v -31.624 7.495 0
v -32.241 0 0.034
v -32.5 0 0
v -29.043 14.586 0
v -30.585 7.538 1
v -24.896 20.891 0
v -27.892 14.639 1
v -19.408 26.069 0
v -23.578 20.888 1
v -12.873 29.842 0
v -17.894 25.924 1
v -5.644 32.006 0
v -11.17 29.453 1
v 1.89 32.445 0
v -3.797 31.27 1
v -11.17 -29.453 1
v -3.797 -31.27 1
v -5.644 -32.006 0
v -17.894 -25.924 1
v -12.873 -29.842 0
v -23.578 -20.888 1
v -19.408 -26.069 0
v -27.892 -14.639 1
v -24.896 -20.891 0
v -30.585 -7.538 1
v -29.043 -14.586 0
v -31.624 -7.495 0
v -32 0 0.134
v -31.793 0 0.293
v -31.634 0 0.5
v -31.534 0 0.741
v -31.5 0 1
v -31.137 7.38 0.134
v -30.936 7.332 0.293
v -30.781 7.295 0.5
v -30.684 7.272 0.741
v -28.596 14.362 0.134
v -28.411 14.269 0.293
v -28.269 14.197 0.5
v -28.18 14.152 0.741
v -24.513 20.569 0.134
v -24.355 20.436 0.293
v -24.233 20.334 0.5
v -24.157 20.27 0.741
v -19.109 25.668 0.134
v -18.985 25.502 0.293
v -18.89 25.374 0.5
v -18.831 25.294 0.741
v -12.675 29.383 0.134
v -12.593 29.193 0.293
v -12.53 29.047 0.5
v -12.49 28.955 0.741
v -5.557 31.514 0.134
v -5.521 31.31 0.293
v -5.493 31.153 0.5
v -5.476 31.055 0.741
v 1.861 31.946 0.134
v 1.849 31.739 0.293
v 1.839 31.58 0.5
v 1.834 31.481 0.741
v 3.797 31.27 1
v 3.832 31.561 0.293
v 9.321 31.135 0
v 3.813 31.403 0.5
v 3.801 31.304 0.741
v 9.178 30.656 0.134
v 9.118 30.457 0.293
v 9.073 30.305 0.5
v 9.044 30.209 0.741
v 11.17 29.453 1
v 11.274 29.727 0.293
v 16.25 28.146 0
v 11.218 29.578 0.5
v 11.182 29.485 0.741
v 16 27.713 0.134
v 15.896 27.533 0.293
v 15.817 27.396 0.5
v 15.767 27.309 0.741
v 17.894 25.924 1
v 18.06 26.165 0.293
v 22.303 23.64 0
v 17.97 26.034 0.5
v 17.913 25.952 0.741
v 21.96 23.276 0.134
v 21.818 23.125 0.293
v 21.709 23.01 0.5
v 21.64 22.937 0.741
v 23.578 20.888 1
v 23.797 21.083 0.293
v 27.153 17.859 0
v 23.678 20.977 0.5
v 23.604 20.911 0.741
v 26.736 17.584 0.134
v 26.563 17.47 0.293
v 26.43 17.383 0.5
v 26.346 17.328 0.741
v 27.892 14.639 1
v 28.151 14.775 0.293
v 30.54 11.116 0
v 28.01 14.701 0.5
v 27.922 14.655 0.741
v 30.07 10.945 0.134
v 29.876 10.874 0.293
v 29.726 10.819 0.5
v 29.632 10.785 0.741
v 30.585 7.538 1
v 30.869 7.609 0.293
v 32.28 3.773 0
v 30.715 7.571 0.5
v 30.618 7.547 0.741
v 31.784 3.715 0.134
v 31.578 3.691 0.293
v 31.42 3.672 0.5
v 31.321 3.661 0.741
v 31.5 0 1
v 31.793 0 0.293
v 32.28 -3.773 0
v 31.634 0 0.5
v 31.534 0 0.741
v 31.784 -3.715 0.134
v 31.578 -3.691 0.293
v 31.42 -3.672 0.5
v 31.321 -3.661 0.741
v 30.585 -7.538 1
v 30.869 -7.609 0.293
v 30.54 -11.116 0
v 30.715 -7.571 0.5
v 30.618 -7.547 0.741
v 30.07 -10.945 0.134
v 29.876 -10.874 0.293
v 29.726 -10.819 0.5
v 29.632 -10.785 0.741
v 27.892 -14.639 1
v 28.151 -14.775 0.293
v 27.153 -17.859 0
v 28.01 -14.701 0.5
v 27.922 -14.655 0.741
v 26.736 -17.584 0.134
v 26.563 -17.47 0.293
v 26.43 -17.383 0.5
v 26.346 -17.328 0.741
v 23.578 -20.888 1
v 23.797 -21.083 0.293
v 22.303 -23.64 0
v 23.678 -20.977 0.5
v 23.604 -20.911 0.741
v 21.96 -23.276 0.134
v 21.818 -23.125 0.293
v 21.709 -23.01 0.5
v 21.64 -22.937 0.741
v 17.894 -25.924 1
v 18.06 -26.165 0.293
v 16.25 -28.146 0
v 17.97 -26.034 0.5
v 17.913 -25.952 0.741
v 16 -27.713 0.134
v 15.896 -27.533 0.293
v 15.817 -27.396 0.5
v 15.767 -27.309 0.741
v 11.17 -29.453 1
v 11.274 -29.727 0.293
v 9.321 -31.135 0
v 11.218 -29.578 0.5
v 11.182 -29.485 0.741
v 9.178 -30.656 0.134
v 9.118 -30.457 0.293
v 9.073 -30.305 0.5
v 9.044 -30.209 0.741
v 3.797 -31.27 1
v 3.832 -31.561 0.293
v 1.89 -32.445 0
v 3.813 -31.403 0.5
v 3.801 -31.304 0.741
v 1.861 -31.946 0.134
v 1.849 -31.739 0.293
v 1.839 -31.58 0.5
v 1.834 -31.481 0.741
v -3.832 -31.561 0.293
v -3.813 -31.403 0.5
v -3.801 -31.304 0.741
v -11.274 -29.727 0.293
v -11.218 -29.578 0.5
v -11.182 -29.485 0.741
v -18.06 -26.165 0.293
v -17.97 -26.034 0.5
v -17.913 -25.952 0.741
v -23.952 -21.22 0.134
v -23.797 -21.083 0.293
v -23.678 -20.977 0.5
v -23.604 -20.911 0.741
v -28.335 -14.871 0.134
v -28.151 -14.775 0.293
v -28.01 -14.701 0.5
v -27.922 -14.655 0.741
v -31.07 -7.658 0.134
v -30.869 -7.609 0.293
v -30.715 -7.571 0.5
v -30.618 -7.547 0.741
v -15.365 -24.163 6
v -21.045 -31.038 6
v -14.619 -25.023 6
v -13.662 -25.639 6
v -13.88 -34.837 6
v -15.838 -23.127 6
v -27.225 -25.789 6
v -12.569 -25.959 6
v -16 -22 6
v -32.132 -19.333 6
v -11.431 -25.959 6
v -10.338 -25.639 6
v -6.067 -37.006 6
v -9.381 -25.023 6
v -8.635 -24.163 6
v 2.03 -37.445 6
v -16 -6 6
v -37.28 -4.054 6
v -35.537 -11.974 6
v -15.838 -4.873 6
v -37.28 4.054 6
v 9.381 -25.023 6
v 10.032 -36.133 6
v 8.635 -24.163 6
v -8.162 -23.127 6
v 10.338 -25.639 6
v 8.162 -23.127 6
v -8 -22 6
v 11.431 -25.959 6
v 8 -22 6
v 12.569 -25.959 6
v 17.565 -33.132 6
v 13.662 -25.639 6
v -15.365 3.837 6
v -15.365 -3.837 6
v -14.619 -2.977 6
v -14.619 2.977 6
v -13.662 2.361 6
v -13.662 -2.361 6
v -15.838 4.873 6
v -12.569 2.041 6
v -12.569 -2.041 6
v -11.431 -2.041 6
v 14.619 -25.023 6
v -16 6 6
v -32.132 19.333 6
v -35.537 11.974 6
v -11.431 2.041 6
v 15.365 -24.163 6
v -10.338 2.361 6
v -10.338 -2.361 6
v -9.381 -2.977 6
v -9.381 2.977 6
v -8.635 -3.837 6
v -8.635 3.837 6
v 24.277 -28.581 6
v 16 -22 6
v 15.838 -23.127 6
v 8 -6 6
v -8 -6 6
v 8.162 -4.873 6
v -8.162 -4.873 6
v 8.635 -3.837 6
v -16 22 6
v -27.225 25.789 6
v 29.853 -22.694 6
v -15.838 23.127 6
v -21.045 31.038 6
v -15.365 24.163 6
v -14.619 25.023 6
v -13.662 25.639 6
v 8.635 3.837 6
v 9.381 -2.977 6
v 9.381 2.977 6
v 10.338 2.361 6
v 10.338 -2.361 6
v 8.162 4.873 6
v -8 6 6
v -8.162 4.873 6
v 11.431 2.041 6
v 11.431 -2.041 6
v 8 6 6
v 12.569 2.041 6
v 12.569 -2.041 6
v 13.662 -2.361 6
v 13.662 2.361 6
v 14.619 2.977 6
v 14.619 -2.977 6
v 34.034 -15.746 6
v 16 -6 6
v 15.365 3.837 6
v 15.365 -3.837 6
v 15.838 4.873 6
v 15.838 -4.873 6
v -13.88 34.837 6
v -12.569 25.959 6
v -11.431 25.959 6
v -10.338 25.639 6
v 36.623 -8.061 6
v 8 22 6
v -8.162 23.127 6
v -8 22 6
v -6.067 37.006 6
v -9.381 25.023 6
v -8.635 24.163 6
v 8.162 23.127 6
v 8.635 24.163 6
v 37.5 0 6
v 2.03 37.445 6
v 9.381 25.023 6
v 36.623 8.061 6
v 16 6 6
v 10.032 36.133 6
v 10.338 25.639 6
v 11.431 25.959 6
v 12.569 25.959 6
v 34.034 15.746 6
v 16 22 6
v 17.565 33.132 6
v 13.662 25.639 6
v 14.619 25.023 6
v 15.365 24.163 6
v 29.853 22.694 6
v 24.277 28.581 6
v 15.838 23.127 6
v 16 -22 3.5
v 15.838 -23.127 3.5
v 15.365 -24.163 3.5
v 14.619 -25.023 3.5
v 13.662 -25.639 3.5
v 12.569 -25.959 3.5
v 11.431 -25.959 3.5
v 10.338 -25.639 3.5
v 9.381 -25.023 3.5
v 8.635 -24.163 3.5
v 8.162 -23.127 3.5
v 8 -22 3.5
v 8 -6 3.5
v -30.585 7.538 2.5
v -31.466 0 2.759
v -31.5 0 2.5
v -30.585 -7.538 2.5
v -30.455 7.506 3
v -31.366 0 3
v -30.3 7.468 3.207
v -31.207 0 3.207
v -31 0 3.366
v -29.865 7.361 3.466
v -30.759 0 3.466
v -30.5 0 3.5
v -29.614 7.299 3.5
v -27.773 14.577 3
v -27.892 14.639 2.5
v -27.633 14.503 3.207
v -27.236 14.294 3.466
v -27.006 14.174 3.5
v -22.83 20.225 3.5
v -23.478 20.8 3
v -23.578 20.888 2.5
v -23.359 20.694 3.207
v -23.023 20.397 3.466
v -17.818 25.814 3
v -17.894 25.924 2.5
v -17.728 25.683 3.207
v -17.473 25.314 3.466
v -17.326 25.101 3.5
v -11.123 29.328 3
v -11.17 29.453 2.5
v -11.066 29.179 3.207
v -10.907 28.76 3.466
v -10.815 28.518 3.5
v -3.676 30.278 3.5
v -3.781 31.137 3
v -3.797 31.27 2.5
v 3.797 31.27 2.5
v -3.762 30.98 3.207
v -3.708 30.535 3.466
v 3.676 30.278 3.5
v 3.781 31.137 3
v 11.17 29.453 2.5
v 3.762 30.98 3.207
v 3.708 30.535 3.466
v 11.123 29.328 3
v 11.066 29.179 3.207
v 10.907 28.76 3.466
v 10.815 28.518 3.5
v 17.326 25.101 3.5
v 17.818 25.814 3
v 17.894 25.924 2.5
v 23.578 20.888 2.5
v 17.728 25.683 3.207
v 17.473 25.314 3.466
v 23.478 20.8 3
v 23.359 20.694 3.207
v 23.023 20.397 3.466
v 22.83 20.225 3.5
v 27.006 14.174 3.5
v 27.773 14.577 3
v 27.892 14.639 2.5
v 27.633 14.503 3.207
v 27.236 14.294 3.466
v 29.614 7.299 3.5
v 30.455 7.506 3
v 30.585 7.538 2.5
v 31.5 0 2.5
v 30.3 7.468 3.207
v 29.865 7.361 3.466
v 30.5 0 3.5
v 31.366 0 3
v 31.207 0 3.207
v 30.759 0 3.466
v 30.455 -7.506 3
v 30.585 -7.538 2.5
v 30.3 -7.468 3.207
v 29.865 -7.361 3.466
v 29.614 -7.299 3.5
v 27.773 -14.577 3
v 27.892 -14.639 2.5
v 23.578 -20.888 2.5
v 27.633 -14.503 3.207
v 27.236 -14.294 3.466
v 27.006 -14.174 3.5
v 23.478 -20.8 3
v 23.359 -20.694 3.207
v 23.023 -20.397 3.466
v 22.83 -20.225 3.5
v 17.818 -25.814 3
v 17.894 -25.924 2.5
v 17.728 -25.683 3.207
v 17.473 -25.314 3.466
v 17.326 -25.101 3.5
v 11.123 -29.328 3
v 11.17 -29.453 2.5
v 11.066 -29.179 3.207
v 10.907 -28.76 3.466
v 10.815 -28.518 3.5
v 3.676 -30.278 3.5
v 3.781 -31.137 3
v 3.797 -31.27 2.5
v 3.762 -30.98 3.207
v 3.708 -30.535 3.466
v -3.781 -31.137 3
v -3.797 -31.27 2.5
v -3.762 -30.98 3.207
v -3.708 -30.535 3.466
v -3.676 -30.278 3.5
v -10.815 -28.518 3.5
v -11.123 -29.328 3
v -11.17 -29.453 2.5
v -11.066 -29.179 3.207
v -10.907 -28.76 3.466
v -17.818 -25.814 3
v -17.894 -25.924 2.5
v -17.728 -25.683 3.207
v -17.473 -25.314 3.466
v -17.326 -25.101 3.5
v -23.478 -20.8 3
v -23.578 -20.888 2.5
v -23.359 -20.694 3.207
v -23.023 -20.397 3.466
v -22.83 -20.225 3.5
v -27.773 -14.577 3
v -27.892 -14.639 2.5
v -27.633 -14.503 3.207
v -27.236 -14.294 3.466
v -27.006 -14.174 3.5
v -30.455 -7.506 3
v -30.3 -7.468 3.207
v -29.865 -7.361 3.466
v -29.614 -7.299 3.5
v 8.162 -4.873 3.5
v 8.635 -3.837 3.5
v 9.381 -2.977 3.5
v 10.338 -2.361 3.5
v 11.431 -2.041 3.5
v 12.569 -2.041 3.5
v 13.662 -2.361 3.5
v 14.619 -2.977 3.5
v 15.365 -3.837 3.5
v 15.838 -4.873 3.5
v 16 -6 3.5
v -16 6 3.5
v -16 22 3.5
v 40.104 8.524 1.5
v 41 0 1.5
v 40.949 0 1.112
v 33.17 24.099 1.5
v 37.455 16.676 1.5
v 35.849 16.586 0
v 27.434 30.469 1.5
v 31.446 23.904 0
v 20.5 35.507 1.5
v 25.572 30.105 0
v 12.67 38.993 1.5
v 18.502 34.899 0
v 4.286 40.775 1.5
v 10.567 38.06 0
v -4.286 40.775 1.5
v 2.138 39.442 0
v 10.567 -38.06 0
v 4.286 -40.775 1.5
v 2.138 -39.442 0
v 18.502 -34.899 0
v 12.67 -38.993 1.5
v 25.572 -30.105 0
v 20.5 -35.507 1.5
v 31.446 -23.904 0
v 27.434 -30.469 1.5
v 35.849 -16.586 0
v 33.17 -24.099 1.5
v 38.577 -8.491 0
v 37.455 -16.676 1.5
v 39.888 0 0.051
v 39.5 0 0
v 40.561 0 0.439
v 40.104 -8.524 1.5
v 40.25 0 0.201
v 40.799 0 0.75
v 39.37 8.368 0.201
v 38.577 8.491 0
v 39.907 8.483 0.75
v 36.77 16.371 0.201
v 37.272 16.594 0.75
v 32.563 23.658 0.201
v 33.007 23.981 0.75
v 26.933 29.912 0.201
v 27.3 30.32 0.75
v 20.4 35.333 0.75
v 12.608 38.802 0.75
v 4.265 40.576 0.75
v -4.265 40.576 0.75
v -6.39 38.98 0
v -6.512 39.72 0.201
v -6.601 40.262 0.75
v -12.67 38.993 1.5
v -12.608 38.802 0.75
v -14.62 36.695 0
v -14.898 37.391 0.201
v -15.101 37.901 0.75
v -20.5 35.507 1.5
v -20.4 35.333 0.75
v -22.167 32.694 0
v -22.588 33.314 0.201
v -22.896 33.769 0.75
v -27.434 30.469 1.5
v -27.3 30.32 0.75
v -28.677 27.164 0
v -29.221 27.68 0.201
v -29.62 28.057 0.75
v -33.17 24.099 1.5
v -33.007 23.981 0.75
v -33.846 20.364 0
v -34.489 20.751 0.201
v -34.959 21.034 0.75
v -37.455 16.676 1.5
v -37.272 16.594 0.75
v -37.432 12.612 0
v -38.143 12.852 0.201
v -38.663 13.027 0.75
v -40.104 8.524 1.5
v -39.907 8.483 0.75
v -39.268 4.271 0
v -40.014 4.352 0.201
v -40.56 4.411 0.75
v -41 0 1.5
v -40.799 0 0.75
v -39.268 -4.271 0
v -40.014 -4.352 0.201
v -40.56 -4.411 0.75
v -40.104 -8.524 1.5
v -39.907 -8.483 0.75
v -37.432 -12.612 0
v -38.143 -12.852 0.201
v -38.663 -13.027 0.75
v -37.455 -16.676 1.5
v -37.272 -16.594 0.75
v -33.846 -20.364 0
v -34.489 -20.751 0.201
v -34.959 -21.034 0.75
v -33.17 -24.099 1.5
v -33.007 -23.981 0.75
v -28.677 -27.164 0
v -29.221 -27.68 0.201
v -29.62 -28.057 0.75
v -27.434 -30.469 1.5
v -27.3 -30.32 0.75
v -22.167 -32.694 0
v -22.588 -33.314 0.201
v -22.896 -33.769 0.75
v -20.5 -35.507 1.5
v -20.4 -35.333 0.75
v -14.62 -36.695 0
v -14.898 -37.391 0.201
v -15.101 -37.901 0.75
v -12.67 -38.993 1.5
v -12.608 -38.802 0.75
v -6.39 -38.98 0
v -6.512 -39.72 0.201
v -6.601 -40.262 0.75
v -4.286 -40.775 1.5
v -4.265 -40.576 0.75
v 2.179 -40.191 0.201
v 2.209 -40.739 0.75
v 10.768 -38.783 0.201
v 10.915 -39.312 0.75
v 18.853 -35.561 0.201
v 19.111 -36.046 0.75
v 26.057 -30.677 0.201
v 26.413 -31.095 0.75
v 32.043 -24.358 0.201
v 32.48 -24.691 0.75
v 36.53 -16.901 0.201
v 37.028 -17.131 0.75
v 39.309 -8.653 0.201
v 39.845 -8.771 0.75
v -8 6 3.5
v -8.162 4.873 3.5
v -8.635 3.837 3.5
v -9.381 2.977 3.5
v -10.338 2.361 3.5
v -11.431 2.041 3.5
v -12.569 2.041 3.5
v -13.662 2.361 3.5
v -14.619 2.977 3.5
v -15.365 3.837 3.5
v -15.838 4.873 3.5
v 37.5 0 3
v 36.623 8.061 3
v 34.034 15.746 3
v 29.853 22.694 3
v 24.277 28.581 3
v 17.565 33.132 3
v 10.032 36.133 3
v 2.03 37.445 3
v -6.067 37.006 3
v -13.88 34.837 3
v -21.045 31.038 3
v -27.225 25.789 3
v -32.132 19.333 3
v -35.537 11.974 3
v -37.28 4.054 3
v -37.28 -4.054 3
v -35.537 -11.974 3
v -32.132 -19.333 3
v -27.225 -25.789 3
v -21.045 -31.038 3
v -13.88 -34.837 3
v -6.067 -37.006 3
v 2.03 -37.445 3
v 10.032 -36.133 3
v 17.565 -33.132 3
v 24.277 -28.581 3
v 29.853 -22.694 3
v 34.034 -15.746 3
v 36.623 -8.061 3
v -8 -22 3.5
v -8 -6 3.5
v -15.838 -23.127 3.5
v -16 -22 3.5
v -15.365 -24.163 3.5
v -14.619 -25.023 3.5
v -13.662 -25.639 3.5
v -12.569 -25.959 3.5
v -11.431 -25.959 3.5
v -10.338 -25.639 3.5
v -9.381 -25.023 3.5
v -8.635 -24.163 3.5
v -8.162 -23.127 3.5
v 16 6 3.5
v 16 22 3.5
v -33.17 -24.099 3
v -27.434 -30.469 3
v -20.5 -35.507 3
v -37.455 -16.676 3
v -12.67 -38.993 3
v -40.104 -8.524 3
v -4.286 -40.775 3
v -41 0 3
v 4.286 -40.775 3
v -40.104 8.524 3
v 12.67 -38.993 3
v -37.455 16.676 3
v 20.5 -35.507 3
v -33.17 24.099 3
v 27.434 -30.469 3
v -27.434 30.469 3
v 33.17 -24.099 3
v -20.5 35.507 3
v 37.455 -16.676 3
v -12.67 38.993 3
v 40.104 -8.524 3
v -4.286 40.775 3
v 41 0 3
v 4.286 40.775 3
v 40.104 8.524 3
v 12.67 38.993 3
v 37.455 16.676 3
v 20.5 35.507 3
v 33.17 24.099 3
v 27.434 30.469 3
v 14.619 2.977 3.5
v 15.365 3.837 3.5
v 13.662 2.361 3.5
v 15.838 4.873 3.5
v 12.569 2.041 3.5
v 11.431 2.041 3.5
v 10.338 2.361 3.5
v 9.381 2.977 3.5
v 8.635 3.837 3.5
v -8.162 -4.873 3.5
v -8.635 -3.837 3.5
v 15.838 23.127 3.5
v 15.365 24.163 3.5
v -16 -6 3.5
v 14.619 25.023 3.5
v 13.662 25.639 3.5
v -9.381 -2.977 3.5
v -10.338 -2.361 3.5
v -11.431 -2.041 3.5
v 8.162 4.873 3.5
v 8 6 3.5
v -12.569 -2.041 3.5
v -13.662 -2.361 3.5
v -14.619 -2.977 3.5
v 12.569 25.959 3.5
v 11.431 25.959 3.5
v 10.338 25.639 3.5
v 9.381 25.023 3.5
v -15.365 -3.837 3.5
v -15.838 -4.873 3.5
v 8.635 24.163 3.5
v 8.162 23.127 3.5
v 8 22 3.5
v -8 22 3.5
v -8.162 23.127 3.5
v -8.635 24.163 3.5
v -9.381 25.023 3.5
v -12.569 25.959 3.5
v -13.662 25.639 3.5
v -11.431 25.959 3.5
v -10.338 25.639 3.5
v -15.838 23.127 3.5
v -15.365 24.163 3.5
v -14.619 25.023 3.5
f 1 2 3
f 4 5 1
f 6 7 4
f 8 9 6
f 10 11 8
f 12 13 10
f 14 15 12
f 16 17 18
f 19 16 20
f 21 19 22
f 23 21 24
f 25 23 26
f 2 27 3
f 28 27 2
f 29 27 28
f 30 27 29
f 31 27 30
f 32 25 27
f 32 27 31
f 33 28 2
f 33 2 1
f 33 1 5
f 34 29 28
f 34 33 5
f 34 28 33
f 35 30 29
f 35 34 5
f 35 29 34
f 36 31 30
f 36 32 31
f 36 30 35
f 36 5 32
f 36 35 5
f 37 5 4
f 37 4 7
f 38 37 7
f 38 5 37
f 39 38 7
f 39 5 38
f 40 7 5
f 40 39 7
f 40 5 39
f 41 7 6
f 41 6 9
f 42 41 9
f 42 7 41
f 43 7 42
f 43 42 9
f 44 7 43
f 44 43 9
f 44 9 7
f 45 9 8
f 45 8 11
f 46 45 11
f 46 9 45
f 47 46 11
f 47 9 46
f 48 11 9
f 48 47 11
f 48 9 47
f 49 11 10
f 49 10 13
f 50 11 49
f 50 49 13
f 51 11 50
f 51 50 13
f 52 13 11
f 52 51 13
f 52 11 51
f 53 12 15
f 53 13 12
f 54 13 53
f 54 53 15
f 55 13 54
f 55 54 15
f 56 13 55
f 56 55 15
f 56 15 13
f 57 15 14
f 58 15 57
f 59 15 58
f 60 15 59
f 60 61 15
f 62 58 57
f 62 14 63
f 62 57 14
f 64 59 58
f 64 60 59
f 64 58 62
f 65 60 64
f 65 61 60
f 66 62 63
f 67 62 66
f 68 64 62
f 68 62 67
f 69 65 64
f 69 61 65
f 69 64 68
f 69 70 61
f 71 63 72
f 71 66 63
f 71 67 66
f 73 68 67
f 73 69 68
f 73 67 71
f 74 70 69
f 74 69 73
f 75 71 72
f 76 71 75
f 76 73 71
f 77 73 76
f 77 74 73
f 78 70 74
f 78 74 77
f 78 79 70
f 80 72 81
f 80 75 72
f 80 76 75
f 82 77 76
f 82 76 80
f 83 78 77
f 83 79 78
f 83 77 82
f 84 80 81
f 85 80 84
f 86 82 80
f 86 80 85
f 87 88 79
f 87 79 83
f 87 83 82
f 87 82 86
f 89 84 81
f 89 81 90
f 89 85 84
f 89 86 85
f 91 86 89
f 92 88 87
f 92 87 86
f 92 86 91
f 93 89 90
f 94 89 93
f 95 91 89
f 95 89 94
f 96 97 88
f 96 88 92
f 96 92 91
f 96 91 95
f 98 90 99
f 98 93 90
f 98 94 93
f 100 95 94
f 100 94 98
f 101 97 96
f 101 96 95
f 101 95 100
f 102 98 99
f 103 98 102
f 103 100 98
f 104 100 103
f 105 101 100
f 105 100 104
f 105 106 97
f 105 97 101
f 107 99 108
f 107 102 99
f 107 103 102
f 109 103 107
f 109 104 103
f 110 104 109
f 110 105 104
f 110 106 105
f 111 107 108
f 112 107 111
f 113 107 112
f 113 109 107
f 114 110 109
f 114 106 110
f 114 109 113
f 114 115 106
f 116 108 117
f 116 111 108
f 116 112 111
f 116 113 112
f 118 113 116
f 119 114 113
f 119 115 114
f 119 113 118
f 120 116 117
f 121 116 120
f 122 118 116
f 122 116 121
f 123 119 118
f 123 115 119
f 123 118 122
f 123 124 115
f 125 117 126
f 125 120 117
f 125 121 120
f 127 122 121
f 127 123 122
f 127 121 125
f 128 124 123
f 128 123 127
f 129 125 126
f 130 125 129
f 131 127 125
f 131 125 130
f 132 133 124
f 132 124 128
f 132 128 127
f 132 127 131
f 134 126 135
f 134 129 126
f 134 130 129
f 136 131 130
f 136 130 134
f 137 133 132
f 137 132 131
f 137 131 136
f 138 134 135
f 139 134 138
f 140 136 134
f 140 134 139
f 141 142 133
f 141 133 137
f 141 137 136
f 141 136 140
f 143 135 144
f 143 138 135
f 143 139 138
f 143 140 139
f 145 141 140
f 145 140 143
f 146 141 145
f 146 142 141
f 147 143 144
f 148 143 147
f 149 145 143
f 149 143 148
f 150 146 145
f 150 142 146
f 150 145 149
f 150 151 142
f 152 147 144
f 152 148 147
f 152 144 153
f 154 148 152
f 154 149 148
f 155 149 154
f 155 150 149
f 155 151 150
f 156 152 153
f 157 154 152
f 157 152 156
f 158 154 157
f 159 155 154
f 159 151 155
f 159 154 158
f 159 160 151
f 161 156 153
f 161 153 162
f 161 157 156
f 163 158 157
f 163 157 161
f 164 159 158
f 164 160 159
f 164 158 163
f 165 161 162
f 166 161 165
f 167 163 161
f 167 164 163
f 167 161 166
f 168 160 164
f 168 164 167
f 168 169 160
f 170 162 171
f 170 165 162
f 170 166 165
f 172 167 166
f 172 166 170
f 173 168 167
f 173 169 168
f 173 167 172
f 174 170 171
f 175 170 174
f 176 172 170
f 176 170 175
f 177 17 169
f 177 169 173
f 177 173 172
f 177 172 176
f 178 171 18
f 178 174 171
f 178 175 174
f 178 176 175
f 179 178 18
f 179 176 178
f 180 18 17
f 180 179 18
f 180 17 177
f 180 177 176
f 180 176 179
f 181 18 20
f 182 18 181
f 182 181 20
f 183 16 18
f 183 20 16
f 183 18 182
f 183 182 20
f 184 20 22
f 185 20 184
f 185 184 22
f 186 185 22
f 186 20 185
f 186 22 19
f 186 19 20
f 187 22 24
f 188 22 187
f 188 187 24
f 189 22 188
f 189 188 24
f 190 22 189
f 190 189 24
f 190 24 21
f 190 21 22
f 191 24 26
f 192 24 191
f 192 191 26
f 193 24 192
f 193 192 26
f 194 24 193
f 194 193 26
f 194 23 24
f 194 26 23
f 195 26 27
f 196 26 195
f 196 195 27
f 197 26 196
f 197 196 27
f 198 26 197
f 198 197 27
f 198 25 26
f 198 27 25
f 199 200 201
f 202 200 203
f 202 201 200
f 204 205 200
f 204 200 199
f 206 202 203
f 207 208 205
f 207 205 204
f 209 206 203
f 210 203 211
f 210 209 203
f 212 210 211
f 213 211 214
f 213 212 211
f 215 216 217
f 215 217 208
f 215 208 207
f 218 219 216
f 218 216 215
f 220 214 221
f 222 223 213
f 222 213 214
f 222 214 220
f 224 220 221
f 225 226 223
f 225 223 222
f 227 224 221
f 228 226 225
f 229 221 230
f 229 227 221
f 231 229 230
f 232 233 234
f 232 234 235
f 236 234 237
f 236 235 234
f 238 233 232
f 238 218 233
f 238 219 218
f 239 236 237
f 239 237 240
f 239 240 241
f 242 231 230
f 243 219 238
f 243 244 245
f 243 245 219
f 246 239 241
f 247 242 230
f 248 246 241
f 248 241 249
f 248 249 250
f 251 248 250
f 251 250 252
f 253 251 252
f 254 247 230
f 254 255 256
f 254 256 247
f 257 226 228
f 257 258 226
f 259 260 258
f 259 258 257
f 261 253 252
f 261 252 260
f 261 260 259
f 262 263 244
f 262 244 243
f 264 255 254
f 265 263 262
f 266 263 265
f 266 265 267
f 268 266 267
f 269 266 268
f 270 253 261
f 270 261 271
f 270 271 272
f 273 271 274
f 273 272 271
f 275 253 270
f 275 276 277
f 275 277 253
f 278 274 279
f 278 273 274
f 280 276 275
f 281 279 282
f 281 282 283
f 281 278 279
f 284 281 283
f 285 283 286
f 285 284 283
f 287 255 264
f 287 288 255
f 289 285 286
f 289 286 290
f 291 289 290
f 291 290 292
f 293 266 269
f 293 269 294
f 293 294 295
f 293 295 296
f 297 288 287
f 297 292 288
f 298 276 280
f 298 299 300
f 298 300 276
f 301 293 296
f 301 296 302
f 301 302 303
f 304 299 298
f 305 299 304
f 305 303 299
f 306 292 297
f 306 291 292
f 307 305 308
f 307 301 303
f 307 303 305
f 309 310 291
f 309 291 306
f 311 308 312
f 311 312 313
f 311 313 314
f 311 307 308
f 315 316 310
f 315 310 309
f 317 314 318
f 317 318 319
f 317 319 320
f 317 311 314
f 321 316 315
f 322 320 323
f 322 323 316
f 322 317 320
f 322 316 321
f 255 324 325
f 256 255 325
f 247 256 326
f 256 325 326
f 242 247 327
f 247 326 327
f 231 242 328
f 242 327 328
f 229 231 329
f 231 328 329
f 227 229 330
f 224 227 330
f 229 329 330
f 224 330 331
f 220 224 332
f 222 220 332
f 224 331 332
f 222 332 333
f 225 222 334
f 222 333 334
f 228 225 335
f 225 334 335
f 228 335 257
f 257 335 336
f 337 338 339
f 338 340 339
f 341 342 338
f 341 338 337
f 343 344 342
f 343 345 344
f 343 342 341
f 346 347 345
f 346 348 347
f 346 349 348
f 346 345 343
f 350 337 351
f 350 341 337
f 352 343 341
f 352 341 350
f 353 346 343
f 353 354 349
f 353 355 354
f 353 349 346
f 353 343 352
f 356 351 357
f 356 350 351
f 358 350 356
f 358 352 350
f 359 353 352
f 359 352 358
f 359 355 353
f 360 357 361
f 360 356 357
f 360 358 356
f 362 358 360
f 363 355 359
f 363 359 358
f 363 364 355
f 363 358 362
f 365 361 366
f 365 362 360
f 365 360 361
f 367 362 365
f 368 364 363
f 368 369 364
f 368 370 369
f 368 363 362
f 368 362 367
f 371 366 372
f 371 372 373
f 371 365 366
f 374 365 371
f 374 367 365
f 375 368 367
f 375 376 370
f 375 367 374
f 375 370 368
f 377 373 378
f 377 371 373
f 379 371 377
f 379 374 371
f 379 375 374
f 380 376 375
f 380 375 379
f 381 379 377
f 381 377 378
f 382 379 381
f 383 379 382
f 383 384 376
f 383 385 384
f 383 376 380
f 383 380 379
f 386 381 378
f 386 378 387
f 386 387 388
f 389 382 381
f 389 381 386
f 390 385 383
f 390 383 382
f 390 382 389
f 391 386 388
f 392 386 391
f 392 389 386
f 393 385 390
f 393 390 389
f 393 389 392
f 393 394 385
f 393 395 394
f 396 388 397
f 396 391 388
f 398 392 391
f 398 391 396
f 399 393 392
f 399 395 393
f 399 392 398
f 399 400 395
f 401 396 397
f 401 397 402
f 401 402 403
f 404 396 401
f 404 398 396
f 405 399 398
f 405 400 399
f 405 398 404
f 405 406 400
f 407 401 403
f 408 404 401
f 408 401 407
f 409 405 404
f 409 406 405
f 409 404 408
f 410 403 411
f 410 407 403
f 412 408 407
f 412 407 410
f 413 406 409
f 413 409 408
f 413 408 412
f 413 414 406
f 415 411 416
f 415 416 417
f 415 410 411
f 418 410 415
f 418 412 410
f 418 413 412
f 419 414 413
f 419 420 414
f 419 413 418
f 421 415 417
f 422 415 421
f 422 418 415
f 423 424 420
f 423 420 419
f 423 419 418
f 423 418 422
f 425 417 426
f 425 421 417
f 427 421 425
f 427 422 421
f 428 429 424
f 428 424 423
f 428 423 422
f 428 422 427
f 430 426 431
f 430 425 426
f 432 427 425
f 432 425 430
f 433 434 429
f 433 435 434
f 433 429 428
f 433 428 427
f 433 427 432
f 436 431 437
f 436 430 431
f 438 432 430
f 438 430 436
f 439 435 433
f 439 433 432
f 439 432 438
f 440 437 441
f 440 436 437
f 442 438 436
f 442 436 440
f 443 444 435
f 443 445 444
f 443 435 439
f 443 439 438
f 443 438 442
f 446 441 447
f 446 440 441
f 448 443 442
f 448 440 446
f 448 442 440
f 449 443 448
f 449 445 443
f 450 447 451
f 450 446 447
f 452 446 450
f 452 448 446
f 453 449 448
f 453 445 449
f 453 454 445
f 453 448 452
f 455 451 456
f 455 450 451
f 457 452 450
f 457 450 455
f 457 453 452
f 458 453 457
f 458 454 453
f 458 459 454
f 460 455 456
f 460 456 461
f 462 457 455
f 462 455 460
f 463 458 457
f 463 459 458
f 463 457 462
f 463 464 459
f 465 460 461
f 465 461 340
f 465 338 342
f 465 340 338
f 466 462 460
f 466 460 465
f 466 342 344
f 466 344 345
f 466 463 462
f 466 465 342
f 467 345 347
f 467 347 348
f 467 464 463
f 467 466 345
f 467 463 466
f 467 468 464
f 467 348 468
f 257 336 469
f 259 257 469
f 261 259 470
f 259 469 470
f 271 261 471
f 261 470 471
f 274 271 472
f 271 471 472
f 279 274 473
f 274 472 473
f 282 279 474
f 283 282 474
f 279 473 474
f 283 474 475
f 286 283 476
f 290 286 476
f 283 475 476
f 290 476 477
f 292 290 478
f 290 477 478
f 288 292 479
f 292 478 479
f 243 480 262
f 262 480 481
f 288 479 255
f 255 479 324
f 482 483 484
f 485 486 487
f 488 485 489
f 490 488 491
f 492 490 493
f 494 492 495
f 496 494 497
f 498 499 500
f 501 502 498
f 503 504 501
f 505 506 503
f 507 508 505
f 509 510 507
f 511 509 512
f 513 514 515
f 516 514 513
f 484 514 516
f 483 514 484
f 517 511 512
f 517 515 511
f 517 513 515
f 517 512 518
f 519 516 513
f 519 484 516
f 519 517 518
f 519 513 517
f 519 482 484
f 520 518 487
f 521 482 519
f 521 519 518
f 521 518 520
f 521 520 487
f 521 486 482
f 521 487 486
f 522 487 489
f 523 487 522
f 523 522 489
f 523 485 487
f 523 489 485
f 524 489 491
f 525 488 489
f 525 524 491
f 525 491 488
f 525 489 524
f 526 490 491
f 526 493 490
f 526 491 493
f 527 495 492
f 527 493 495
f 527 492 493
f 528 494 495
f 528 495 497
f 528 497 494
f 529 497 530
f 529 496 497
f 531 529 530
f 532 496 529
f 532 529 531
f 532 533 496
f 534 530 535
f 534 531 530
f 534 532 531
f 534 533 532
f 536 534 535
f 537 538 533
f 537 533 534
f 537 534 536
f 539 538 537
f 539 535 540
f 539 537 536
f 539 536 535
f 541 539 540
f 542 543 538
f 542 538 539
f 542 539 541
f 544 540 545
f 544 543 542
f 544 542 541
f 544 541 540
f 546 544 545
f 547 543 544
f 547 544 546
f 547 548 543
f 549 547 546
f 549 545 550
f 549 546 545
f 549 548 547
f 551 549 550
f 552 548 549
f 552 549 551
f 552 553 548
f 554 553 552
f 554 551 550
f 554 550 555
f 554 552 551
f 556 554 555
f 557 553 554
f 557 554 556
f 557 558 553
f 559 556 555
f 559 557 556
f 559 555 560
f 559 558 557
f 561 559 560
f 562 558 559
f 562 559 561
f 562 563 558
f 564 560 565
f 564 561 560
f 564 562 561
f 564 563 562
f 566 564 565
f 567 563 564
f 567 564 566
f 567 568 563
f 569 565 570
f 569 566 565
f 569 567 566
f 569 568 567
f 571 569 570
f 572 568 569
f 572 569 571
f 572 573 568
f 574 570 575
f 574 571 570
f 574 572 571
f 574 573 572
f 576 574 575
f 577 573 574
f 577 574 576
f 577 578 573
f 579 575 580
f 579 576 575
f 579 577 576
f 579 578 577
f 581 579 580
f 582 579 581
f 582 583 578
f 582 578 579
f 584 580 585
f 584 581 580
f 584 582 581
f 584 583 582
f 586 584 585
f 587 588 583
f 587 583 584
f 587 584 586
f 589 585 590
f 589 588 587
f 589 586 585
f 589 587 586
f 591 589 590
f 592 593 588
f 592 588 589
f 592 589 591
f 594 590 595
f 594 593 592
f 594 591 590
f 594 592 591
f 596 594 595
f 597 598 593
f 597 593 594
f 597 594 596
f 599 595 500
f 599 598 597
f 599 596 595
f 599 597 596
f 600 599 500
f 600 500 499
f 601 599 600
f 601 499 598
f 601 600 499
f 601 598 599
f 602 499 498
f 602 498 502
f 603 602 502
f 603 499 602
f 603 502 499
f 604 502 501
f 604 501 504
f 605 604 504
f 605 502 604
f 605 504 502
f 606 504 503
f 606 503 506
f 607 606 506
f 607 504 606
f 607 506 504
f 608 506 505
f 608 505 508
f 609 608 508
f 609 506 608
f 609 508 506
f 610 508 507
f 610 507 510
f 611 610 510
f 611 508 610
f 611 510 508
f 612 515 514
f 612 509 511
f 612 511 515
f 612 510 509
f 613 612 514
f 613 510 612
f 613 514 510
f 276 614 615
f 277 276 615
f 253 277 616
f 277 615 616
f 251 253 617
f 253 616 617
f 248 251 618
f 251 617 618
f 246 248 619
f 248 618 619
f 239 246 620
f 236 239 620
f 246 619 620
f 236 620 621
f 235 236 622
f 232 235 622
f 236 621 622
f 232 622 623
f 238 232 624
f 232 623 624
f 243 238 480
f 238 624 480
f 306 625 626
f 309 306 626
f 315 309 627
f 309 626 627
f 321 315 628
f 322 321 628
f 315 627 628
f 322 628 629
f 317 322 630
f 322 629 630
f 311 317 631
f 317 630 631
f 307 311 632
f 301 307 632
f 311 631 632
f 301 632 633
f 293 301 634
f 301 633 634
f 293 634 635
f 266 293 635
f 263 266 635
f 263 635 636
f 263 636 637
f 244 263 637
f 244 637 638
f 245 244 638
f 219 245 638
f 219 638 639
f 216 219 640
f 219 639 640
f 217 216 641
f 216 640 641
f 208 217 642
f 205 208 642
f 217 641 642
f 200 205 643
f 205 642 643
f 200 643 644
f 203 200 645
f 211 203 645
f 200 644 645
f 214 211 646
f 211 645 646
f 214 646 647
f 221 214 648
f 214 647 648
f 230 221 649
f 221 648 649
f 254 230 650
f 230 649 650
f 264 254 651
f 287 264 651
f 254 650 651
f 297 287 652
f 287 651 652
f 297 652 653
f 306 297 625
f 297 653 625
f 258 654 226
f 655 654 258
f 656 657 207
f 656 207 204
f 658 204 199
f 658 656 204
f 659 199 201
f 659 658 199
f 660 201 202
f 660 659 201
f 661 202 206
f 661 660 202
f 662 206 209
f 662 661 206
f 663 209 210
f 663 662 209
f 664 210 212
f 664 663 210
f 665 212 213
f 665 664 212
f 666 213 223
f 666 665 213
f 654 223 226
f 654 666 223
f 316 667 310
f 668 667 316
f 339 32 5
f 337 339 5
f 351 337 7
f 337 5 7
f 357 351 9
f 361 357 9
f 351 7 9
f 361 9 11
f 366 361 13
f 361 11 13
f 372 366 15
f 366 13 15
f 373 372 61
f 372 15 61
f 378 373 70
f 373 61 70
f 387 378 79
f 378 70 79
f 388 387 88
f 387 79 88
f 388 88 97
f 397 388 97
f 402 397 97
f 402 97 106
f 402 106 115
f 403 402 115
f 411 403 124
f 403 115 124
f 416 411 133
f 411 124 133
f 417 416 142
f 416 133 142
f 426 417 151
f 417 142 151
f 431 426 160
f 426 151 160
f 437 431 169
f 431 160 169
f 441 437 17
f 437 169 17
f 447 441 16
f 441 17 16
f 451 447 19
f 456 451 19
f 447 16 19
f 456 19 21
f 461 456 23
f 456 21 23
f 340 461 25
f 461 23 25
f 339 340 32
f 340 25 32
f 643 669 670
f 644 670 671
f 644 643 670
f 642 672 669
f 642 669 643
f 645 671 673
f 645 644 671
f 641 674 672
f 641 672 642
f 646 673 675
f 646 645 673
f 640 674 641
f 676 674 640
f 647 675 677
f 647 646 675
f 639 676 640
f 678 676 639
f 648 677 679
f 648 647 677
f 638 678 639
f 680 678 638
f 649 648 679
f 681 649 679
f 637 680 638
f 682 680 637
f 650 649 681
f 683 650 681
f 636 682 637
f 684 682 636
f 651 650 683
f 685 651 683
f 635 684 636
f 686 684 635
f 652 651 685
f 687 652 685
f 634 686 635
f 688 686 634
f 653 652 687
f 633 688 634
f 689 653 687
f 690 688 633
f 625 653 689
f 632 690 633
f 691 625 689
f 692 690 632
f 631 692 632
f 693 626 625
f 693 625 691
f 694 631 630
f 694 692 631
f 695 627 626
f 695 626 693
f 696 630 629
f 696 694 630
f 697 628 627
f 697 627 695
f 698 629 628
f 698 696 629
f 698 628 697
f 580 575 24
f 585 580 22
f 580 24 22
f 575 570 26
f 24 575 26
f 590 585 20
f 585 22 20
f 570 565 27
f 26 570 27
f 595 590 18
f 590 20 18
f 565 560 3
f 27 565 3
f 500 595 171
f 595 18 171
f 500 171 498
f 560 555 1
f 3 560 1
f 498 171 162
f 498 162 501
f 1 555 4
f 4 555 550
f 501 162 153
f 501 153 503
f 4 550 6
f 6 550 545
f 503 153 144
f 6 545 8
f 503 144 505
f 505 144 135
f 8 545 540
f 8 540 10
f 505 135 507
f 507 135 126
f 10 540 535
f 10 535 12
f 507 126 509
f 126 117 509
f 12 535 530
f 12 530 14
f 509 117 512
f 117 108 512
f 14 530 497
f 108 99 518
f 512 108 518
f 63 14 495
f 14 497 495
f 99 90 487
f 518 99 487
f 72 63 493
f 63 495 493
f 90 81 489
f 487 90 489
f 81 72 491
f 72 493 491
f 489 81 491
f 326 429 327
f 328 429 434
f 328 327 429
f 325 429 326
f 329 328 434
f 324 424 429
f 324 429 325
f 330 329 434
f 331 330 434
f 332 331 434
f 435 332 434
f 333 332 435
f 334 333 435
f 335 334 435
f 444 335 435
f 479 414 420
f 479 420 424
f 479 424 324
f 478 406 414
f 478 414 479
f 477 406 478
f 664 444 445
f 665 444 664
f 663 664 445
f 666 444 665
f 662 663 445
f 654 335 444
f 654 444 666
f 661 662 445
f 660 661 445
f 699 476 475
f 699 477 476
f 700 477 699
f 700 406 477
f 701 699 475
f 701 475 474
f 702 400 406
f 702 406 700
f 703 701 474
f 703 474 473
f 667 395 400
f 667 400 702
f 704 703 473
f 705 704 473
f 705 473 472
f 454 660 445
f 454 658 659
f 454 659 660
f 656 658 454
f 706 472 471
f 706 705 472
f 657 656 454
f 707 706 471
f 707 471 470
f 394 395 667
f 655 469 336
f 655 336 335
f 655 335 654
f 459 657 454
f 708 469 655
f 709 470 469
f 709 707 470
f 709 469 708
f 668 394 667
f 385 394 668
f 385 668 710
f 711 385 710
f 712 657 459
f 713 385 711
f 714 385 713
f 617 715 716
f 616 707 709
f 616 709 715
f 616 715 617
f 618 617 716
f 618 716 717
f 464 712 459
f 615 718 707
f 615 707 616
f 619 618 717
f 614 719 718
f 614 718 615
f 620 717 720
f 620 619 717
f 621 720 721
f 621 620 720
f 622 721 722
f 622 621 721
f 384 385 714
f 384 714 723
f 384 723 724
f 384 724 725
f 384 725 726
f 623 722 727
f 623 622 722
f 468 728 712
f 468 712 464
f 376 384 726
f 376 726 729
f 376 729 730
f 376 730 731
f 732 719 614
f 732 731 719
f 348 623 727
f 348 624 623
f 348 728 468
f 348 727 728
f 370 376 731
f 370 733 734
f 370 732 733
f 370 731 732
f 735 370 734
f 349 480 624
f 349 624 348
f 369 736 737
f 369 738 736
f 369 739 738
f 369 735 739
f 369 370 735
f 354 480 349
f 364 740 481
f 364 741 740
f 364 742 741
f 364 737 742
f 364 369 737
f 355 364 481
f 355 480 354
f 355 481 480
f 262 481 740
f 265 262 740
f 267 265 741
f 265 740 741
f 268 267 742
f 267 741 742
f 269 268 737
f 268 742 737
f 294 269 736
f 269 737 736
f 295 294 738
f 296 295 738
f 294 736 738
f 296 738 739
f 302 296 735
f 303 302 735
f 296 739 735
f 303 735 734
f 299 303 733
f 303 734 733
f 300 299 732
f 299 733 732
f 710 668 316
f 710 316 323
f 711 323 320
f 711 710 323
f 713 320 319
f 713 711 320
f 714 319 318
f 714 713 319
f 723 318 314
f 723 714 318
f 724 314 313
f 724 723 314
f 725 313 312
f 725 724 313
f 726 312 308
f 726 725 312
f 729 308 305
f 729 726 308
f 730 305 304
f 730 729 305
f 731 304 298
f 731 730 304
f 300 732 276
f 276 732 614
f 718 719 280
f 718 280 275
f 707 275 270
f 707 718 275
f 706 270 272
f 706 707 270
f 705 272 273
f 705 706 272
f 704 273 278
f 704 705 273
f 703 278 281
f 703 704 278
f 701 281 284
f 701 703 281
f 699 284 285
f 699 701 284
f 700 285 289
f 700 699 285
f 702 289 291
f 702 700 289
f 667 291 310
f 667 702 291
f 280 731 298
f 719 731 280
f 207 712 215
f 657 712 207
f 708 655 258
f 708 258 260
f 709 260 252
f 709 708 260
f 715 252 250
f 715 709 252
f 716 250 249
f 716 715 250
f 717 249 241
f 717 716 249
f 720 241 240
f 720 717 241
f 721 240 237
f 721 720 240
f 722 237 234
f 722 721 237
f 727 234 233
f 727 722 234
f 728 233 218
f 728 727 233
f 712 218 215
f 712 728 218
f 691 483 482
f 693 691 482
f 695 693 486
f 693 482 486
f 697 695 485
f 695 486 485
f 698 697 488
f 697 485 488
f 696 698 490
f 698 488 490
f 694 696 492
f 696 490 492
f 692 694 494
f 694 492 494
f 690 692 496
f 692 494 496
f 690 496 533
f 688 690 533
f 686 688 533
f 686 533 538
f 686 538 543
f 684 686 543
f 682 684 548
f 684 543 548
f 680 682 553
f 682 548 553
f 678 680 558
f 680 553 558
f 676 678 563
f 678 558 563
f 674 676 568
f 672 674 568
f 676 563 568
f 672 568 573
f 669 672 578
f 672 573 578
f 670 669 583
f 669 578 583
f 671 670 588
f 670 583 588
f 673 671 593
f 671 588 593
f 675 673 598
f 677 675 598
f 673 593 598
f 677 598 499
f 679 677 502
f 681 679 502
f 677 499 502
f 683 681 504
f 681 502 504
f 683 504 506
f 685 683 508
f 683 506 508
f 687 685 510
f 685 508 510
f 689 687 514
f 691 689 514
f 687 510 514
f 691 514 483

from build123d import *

# Parameters (mm, degrees)
SKETCH1_R           = 41
BOSS_EXTRUDE1_DEPTH = 3
SKETCH2_R           = 37.5
BOSS_EXTRUDE4_DEPTH = 3
SKETCH5_R           = 31.5
CUT_EXTRUDE3_DEPTH  = 3.5
CUT_EXTRUDE6_DEPTH  = 3
FILLET3_R           = 1
FILLET4_R           = 1.5
FILLET5_R           = 1


with BuildPart() as part:
    # Sketch1 → Boss-Extrude1 (new body)
    with BuildSketch(Plane.XY):
        Circle(SKETCH1_R)
    extrude(amount=BOSS_EXTRUDE1_DEPTH)

    # Sketch2 → Boss-Extrude4 (add)
    with BuildSketch(Plane.XY.offset(3)):
        Circle(SKETCH2_R)
    extrude(amount=BOSS_EXTRUDE4_DEPTH)

    # Sketch5 → Cut-Extrude3 (cut)
    with BuildSketch(Plane(origin=(0, 0, 0), x_dir=(-1, 0, 0), z_dir=(0, 0, -1))):
        Circle(SKETCH5_R)
    extrude(amount=-CUT_EXTRUDE3_DEPTH, mode=Mode.SUBTRACT)

    # Sketch6 → Cut-Extrude6 (cut)
    with BuildSketch(Plane(origin=(0, 0, 3.5), x_dir=(-1, 0, 0), z_dir=(0, 0, -1))):
        with BuildLine():
            Line((-16, 6), (-16, 22))
            ThreePointArc((-16, 22), (-12, 26), (-8, 22))
            Line((-8, 22), (-8, 6))
            ThreePointArc((-8, 6), (-12, 2), (-16, 6))
        make_face()
        with BuildLine():
            Line((16, 6), (16, 22))
            ThreePointArc((16, 22), (12, 26), (8, 22))
            Line((8, 22), (8, 6))
            ThreePointArc((8, 6), (12, 2), (16, 6))
        make_face()
        with BuildLine():
            Line((16, -6), (16, -22))
            ThreePointArc((16, -22), (12, -26), (8, -22))
            Line((8, -22), (8, -6))
            ThreePointArc((8, -6), (12, -2), (16, -6))
        make_face()
        with BuildLine():
            Line((-16, -6), (-16, -22))
            ThreePointArc((-16, -22), (-12, -26), (-8, -22))
            Line((-8, -22), (-8, -6))
            ThreePointArc((-8, -6), (-12, -2), (-16, -6))
        make_face()
    extrude(amount=-CUT_EXTRUDE6_DEPTH, mode=Mode.SUBTRACT)

    # Fillet3
    fillet3_edges = [part.edges().sort_by_distance(p)[0] for p in [
        (31.5, 0, 0),
    ]]
    fillet(fillet3_edges, radius=FILLET3_R)

    # Fillet4
    fillet4_edges = [part.edges().sort_by_distance(p)[0] for p in [
        (-41, 0, 0),
    ]]
    fillet(fillet4_edges, radius=FILLET4_R)

    # Fillet5
    fillet5_edges = [part.edges().sort_by_distance(p)[0] for p in [
        (31.5, 0, 3.5),
    ]]
    fillet(fillet5_edges, radius=FILLET5_R)


solid = part.part
